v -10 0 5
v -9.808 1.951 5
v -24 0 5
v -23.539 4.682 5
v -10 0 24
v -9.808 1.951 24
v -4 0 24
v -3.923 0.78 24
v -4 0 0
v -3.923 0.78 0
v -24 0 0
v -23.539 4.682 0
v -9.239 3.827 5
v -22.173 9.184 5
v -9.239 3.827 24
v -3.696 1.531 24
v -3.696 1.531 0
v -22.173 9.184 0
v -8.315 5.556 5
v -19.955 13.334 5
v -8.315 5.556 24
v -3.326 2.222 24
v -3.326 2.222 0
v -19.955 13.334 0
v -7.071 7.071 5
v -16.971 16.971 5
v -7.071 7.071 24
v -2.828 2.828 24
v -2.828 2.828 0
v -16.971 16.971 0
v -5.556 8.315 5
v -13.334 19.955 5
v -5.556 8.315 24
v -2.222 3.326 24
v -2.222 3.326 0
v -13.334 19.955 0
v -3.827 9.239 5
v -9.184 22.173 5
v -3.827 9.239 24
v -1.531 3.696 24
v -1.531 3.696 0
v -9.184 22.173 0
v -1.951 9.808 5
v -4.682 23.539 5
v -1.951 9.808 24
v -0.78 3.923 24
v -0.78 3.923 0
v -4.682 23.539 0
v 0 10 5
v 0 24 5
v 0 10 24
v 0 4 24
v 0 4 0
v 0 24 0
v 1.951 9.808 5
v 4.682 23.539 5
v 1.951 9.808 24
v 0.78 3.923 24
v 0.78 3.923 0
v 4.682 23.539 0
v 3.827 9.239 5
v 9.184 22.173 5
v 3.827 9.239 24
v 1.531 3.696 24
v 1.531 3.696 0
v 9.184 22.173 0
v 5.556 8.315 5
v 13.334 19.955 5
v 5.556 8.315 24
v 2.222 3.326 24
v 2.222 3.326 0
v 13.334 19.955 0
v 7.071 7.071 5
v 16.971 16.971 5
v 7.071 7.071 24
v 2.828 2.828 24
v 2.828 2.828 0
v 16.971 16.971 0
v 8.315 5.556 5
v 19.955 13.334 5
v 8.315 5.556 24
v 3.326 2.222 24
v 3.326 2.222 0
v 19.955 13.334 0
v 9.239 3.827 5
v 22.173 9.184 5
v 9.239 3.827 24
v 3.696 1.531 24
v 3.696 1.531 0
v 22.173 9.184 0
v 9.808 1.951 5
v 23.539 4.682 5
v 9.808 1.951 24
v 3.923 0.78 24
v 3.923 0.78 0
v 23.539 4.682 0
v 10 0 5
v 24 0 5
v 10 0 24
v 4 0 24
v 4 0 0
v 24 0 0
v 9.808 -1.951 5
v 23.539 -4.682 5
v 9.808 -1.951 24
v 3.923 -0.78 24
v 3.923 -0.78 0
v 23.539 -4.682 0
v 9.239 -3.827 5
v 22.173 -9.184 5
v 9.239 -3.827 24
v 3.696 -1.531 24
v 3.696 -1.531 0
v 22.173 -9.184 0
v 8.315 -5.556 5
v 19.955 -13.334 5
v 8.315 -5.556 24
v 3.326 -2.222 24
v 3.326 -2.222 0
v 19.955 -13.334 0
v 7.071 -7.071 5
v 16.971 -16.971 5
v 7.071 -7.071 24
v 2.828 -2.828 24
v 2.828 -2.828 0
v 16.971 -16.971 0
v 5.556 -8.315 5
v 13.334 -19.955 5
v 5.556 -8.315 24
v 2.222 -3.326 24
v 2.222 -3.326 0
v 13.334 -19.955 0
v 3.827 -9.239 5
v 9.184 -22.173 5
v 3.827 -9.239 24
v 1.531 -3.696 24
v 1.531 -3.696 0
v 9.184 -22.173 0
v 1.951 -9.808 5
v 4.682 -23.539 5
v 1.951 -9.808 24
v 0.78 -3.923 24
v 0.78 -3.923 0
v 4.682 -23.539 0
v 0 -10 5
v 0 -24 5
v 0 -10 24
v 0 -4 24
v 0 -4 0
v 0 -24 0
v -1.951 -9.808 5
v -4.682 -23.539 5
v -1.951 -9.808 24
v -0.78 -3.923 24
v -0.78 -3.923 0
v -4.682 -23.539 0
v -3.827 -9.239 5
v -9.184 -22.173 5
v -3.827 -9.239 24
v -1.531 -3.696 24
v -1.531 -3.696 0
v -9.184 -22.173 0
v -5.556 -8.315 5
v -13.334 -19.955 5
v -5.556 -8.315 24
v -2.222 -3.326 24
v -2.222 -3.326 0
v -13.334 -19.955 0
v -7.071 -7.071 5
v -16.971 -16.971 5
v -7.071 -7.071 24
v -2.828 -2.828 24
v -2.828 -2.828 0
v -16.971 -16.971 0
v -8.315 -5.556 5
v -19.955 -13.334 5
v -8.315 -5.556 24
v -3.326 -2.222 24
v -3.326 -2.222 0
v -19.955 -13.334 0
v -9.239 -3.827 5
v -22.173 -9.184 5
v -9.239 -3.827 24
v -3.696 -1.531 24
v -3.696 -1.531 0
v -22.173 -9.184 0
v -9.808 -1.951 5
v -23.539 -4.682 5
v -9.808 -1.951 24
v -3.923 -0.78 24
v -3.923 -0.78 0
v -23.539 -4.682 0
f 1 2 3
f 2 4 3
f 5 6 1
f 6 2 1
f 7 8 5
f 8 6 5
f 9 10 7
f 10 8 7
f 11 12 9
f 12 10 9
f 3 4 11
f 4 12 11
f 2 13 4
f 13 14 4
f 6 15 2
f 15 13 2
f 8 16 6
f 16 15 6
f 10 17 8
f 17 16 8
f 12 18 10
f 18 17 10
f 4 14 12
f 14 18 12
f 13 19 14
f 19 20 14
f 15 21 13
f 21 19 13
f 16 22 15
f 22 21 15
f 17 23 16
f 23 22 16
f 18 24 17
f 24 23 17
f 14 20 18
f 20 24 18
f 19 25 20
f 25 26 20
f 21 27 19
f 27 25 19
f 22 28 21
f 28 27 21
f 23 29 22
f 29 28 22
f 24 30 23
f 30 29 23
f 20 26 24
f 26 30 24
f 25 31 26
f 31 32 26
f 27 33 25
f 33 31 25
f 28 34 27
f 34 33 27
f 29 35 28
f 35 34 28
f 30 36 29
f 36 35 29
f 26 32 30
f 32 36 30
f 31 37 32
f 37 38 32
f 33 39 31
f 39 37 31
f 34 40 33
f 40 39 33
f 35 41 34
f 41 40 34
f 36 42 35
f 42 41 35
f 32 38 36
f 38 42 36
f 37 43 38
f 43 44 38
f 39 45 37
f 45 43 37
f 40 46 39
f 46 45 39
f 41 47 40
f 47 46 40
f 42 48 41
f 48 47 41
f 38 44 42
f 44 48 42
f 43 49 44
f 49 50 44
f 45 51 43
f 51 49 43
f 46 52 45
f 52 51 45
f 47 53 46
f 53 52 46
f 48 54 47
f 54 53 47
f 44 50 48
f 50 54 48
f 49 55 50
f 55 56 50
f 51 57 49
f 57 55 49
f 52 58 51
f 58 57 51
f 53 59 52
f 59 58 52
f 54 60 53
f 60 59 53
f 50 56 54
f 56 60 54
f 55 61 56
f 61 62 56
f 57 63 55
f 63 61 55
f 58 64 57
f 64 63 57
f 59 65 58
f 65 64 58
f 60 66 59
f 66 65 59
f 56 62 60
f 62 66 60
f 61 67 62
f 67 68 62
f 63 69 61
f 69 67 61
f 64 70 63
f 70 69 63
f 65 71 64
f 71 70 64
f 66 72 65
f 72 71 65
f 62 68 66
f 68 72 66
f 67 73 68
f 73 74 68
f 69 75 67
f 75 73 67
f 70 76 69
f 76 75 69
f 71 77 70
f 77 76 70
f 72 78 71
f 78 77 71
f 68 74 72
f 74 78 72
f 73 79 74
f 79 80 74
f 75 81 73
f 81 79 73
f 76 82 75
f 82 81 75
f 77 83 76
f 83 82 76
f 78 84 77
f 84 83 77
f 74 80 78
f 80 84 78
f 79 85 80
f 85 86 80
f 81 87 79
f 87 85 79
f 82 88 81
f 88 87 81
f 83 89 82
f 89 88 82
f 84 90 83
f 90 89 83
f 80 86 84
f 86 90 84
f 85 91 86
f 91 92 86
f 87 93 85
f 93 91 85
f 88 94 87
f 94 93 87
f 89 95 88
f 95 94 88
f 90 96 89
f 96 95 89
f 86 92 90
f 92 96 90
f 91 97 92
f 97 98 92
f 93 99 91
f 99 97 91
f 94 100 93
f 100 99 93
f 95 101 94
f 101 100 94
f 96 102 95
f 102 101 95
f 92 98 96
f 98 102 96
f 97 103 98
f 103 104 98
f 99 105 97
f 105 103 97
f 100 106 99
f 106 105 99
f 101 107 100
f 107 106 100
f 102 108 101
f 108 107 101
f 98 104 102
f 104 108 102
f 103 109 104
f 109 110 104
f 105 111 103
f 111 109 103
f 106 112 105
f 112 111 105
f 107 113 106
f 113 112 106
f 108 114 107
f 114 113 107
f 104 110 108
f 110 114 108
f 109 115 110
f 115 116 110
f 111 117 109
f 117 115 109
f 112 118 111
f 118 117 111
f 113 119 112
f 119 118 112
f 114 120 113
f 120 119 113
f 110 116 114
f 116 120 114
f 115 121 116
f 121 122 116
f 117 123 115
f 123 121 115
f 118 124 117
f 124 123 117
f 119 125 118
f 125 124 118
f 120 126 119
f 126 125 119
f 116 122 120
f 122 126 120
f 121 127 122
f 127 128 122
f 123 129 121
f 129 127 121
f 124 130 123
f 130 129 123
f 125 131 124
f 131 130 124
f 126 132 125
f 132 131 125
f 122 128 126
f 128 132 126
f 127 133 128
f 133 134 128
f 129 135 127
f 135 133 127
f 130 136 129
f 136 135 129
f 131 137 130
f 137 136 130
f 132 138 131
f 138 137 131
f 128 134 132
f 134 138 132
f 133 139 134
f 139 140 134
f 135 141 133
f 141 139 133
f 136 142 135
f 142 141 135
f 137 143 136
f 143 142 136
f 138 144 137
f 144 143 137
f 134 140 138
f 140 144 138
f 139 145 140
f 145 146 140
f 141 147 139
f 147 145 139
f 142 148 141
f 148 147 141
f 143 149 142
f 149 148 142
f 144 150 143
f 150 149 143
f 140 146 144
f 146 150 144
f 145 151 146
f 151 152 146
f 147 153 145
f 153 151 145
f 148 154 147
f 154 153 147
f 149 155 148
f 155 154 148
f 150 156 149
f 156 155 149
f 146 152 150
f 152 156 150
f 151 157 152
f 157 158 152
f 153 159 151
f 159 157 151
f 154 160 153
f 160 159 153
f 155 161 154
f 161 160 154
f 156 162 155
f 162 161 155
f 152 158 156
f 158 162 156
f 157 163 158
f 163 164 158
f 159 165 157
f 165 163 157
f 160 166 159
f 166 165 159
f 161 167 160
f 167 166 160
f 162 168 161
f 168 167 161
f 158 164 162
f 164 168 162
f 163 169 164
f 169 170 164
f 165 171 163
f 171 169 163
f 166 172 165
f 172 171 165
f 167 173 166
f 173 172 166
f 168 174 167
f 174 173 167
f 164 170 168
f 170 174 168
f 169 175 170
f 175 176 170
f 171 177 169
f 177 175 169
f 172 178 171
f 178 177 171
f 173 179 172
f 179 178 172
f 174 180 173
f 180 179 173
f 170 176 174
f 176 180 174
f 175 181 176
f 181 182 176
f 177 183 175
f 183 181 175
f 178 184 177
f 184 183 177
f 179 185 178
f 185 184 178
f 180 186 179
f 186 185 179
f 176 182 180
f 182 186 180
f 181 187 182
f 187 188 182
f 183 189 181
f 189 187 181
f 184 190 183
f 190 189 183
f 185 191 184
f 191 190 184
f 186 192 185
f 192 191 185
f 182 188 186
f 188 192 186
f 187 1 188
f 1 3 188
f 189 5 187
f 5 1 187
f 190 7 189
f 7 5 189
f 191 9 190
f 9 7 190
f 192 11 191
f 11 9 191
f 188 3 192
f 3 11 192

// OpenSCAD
$fn = 32;

// ----------------------------------------------------------------------
// Revolved part: flanged bushing R24
// ----------------------------------------------------------------------

// --- parameters (mm) ---
bore_r = 4;               // bore radius
flange_r = 24;            // flange radius
flange_h = 5;             // flange thickness
sleeve_r = 10;            // sleeve radius
total_h = 24;             // overall height
revolve_angle = 360;      // revolve sweep, degrees

bore_d = 2 * bore_r;
flange_d = 2 * flange_r;
sleeve_d = 2 * sleeve_r;

profile = [[4, 0], [24, 0], [24, 5], [10, 5], [10, 24], [4, 24]];  // primary outline, 6 points, counter clockwise

// --- the one profile operation ---
rotate_extrude(angle = revolve_angle) polygon(points = profile);
